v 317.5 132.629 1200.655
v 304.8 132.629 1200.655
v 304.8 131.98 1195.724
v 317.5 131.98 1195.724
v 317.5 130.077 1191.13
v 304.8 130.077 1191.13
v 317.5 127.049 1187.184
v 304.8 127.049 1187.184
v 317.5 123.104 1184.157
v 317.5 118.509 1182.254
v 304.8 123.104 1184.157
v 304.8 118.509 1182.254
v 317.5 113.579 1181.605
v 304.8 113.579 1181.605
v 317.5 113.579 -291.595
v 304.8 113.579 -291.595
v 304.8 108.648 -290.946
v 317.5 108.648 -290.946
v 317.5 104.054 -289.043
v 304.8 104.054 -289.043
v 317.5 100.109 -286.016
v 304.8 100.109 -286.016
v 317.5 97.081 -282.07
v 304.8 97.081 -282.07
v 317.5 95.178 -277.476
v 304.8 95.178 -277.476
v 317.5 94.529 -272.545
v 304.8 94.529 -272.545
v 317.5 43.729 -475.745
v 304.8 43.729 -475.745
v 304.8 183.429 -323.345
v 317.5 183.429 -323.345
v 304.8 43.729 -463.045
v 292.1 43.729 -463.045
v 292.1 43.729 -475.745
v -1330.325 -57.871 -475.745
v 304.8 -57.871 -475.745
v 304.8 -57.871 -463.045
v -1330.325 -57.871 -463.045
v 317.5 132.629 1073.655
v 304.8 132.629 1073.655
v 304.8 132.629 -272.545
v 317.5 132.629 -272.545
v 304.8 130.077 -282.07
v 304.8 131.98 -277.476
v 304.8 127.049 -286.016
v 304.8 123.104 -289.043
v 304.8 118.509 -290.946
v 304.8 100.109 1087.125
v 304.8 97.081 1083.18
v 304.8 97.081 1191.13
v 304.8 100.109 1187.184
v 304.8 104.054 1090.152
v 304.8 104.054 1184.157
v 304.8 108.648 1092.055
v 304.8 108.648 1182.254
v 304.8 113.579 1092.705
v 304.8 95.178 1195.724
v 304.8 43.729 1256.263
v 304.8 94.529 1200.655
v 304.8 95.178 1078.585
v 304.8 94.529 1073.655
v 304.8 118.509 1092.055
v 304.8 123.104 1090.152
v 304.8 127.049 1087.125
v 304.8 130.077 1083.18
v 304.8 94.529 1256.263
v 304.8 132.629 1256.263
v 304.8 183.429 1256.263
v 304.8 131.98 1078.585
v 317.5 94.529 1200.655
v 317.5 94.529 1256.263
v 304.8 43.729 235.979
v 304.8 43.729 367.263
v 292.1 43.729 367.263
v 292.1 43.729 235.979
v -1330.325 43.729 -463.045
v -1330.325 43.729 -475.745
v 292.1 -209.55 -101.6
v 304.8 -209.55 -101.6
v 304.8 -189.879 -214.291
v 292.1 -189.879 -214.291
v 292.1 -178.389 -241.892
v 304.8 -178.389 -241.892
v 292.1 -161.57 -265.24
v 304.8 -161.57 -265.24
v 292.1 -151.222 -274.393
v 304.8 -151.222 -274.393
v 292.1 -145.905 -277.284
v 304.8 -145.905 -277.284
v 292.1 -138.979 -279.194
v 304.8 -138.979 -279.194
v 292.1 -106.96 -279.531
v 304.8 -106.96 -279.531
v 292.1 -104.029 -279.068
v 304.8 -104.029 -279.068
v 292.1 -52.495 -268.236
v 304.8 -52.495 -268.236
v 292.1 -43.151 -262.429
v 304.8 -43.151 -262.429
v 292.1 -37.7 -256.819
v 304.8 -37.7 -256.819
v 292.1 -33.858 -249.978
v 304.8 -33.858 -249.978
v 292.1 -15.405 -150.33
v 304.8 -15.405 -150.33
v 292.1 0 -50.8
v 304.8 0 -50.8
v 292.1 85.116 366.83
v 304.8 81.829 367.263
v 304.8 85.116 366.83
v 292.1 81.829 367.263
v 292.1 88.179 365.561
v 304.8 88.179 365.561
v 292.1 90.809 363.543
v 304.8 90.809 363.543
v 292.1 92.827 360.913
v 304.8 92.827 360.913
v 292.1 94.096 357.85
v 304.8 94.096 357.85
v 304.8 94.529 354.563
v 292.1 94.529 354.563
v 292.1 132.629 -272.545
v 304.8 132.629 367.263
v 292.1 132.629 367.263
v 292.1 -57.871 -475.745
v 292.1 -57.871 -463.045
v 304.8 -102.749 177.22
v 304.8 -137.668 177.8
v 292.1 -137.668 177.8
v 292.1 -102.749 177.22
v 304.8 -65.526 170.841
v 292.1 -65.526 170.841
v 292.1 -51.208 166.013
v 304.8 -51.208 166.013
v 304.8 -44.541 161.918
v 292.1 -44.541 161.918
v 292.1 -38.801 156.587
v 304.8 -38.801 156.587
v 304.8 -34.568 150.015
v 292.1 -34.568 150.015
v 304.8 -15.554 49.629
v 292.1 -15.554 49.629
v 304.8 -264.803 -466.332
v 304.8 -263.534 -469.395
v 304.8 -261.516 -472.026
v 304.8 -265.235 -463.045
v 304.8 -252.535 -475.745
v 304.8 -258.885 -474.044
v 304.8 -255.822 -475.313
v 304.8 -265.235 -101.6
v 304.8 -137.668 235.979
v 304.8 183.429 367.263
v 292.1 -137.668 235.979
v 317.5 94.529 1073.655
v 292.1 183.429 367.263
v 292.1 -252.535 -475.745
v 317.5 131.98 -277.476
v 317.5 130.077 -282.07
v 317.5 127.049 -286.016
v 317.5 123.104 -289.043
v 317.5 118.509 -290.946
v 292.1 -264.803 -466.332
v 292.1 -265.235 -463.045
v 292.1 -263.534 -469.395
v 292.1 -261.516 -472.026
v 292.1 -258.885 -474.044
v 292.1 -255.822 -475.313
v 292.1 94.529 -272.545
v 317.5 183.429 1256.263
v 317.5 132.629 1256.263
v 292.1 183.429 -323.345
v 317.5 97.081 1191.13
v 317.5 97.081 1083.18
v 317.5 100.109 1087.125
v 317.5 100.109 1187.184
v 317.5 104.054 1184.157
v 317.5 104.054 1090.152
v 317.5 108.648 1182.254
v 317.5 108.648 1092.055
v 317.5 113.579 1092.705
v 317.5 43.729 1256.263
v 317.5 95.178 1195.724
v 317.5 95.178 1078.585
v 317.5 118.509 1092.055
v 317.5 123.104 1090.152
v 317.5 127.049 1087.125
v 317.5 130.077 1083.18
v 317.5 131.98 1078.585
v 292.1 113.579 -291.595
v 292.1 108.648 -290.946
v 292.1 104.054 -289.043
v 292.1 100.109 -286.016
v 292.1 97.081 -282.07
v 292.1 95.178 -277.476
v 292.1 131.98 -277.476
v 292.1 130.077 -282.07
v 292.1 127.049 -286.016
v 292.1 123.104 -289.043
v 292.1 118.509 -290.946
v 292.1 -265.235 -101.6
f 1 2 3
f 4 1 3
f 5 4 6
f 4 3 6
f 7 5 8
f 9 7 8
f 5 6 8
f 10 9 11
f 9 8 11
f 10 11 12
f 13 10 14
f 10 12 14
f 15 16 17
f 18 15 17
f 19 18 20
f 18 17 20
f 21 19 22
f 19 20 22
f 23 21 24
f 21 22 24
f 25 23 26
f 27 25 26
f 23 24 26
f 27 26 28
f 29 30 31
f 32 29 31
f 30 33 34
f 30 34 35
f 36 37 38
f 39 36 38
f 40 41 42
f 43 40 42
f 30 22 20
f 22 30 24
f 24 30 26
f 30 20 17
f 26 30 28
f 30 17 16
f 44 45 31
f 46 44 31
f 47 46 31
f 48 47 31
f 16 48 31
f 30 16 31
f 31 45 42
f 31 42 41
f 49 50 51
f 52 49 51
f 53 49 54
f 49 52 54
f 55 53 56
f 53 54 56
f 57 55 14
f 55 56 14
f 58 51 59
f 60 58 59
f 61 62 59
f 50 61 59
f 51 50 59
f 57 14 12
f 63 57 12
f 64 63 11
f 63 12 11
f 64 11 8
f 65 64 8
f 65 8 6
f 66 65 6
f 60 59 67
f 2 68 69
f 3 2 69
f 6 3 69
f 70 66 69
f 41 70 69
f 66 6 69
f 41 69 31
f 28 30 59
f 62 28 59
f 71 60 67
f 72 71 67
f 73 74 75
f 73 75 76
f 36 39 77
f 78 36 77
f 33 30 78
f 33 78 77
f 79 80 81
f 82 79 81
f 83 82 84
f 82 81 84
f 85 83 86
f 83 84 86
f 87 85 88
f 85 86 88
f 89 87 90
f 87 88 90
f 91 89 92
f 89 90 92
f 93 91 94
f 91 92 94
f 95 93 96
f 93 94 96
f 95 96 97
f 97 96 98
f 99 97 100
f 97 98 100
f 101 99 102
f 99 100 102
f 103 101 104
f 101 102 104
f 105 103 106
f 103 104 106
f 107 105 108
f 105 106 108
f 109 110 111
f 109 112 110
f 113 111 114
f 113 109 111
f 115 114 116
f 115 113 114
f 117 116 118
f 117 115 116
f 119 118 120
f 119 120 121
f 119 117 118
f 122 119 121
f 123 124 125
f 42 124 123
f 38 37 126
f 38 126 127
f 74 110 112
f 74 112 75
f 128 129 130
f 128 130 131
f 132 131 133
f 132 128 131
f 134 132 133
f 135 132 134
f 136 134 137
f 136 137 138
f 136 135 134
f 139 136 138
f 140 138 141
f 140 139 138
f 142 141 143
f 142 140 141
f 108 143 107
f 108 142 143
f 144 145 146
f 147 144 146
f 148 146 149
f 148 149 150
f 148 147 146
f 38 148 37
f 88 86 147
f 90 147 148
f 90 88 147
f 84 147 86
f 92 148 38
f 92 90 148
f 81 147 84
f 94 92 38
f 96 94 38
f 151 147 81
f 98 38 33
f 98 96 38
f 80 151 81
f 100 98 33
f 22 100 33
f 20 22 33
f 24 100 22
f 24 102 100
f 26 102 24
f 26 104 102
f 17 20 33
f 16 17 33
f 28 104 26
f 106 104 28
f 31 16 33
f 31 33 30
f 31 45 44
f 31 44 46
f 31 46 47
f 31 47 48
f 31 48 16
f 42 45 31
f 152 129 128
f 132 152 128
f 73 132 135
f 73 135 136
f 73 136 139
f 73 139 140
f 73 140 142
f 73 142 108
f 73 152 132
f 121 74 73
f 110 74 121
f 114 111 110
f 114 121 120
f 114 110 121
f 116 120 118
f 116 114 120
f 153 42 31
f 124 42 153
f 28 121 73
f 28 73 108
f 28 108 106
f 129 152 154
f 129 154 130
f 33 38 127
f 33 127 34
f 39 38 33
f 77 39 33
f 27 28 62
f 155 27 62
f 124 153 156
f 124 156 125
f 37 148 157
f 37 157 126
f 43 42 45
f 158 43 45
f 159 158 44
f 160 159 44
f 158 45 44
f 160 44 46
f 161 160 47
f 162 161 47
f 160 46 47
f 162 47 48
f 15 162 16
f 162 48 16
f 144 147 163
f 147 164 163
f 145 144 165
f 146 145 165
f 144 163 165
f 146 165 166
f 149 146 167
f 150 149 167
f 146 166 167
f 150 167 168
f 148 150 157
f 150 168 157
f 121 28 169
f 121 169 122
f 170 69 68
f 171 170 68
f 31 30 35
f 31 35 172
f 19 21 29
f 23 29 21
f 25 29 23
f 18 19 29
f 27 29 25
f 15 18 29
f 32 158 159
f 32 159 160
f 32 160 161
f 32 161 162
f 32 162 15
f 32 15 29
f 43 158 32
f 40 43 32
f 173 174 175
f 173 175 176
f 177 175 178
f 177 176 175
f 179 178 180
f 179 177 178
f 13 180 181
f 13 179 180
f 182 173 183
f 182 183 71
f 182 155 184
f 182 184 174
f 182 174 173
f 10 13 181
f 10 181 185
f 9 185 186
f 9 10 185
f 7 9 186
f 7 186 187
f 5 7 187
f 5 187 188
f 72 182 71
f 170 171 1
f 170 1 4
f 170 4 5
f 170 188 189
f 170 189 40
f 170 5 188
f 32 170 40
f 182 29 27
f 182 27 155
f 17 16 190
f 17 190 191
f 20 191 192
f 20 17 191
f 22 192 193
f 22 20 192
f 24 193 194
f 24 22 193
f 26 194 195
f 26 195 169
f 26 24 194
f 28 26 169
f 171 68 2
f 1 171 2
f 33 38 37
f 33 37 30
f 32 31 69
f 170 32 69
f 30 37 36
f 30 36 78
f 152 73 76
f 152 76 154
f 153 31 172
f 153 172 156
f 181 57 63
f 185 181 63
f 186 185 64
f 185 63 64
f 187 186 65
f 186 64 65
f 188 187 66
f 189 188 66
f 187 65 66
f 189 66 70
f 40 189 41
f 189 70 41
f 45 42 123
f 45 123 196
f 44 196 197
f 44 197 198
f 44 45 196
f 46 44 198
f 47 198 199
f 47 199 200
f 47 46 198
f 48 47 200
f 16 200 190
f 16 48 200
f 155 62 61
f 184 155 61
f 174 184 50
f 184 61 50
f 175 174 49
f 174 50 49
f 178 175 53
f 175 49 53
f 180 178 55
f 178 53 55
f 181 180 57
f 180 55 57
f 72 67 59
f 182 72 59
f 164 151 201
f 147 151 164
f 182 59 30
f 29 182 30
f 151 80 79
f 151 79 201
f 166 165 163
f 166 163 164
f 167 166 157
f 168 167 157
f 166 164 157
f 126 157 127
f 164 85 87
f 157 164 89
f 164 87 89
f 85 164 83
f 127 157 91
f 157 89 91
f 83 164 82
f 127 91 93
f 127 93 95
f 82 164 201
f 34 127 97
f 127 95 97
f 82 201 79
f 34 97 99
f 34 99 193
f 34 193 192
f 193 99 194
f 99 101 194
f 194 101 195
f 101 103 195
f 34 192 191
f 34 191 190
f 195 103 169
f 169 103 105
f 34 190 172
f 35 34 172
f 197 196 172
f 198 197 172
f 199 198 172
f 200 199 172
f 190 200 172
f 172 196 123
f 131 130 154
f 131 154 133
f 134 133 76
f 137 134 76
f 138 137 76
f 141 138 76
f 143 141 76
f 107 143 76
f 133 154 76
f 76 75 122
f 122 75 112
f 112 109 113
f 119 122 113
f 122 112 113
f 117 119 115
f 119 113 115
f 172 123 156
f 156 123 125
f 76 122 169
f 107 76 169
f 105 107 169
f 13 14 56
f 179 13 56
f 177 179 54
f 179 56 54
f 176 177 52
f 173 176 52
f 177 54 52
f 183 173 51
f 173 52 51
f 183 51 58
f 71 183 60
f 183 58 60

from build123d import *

# Parameters (mm, degrees)
F2_DEPTH = 12.7
F3_DEPTH = 12.7
F4_R     = 12.7
F1_W     = 101.6
F1_H     = 12.7
F5_DEPTH = 1635.125


# Not quite as in the source:
# - a feature names something its author has since deleted; it is built from what else it names


with BuildPart() as f2:
    # F1 (on offset) → F2 (new body)
    with BuildSketch(Plane.YZ.offset(304.8)):
        with BuildLine():
            Line((94.5288948266, 367.2625439401), (43.7288948266, 367.2625439401))
            Line((43.7288948266, 367.2625439401), (43.7288948266, 235.9791994095))
            Line((43.7288948266, 235.9791994095), (43.7288948266, -323.3454918831))
            Line((43.7288948266, -323.3454918831), (113.5788948266, -323.3454918831))
            Line((113.5788948266, -323.3454918831), (113.5788948266, -291.5954918831))
            ThreePointArc((113.5788948266, -291.5954918831), (100.108510645, -286.0158760647), (94.5288948266, -272.5454918831))
            Line((94.5288948266, -272.5454918831), (94.5288948266, 367.2625439401))
        make_face()
        with BuildLine():
            Line((113.5788948266, -291.5954918831), (113.5788948266, -323.3454918831))
            Line((113.5788948266, -323.3454918831), (183.4288948266, -323.3454918831))
            Line((183.4288948266, -323.3454918831), (183.4288948266, 367.2625439401))
            Line((183.4288948266, 367.2625439401), (132.6288948266, 367.2625439401))
            Line((132.6288948266, 367.2625439401), (132.6288948266, -272.5454918831))
            ThreePointArc((132.6288948266, -272.5454918831), (127.0492790082, -286.0158760647), (113.5788948266, -291.5954918831))
        make_face()
        Polygon((113.5788948266, -323.3454918831), (43.7288948266, -323.3454918831), (43.7288948266, -463.0454918831), (43.7288948266, -475.7454918831), (183.4288948266, -323.3454918831), align=None)
        with BuildLine():
            Line((43.7288948266, 1256.2625439401), (43.7288948266, 367.2625439401))
            Line((43.7288948266, 367.2625439401), (94.5288948266, 367.2625439401))
            Line((94.5288948266, 367.2625439401), (94.5288948266, 1073.6545081169))
            ThreePointArc((94.5288948266, 1073.6545081169), (100.108510645, 1087.1248922985), (113.5788948266, 1092.7045081169))
            Line((113.5788948266, 1092.7045081169), (113.5788948266, 1181.6045081169))
            ThreePointArc((113.5788948266, 1181.6045081169), (100.108510645, 1187.1841239353), (94.5288948266, 1200.6545081169))
            Line((94.5288948266, 1200.6545081169), (94.5288948266, 1256.2625439401))
            Line((94.5288948266, 1256.2625439401), (43.7288948266, 1256.2625439401))
        make_face()
        with BuildLine():
            Line((113.5788948266, 1181.6045081169), (113.5788948266, 1092.7045081169))
            ThreePointArc((113.5788948266, 1092.7045081169), (127.0492790082, 1087.1248922985), (132.6288948266, 1073.6545081169))
            Line((132.6288948266, 1073.6545081169), (132.6288948266, 367.2625439401))
            Line((132.6288948266, 367.2625439401), (183.4288948266, 367.2625439401))
            Line((183.4288948266, 367.2625439401), (183.4288948266, 1256.2625439401))
            Line((183.4288948266, 1256.2625439401), (132.6288948266, 1256.2625439401))
            Line((132.6288948266, 1256.2625439401), (132.6288948266, 1200.6545081169))
            ThreePointArc((132.6288948266, 1200.6545081169), (127.0492790082, 1187.1841239353), (113.5788948266, 1181.6045081169))
        make_face()
    extrude(amount=F2_DEPTH)


with BuildPart() as f3:
    # F1 (on offset) → F3 (new body)
    with BuildSketch(Plane.YZ.offset(304.8)):
        with BuildLine():
            Line((94.5288948266, 367.2625439401), (43.7288948266, 367.2625439401))
            Line((43.7288948266, 367.2625439401), (43.7288948266, 235.9791994095))
            Line((43.7288948266, 235.9791994095), (43.7288948266, -323.3454918831))
            Line((43.7288948266, -323.3454918831), (113.5788948266, -323.3454918831))
            Line((113.5788948266, -323.3454918831), (113.5788948266, -291.5954918831))
            ThreePointArc((113.5788948266, -291.5954918831), (100.108510645, -286.0158760647), (94.5288948266, -272.5454918831))
            Line((94.5288948266, -272.5454918831), (94.5288948266, 367.2625439401))
        make_face()
        with BuildLine():
            Line((113.5788948266, -291.5954918831), (113.5788948266, -323.3454918831))
            Line((113.5788948266, -323.3454918831), (183.4288948266, -323.3454918831))
            Line((183.4288948266, -323.3454918831), (183.4288948266, 367.2625439401))
            Line((183.4288948266, 367.2625439401), (132.6288948266, 367.2625439401))
            Line((132.6288948266, 367.2625439401), (132.6288948266, -272.5454918831))
            ThreePointArc((132.6288948266, -272.5454918831), (127.0492790082, -286.0158760647), (113.5788948266, -291.5954918831))
        make_face()
        Polygon((113.5788948266, -323.3454918831), (43.7288948266, -323.3454918831), (43.7288948266, -463.0454918831), (43.7288948266, -475.7454918831), (183.4288948266, -323.3454918831), align=None)
        with BuildLine():
            Line((43.7288948266, -323.3454918831), (43.7288948266, 235.9791994095))
            Line((43.7288948266, 235.9791994095), (-137.668, 235.9791994095))
            Line((-137.668, 235.9791994095), (-137.668, 177.8))
            add(Edge.make_bspline(
                [(-137.668, 177.8), (-126.7329989699, 179.3615885186), (-105.2927447568, 177.9606906514), (-104.7127420428, 177.4566242644), (-76.3870444308, 172.7468877699), (-53.8224361201, 169.2775097956), (-32.509347536, 153.9521162966), (-29.6589175986, 126.5444267311), (-24.1316654123, 101.7655079647), (-20.1515477066, 76.1578540031), (-15.6616591497, 50.824742265), (-11.697736498, 25.3907441448), (-7.6524561633, 0.0190908821), (-3.4145104905, -25.4546553024), (-1.1633071199, -42.1649645919), (0, -50.8)],
                knots=[0.4455893289, 0.4455893289, 0.4455893289, 0.4455893289, 0.4958311767, 0.5059382093, 0.5510171418, 0.5964071949, 0.6390826252, 0.6845795949, 0.7297371842, 0.7748161167, 0.8198950491, 0.8649377925, 0.9099805359, 0.9550232793, 1, 1, 1, 1], degree=3))
            add(Edge.make_bspline(
                [(-209.55, -101.6), (-208.6251552358, -110.5689174615), (-206.6600994581, -126.7951349357), (-202.7469529896, -152.4849572895), (-198.4813992324, -177.8058366363), (-193.5047411073, -203.4515063023), (-185.4017669459, -228.8366501901), (-172.2926489077, -254.3432279678), (-155.2398352434, -272.1810431706), (-140.6010964135, -281.8677246091), (-105.2927447568, -279.5606906514), (-104.7127420428, -279.0566242644), (-76.3870444308, -274.3468877699), (-53.8224361201, -270.8775097956), (-32.509347536, -255.5521162966), (-29.6589175986, -228.1444267311), (-24.1316654123, -203.3655079647), (-20.1515477066, -177.7578540031), (-15.6616591497, -152.424742265), (-11.697736498, -126.9907441448), (-7.6524561633, -101.6190908821), (-3.4145104905, -76.1453446976), (-1.1633071199, -59.4350354081), (0, -50.8)],
                knots=[0.0897198342, 0.0897198342, 0.0897198342, 0.0897198342, 0.1346390991, 0.1796477671, 0.2247266995, 0.269971206, 0.3159019443, 0.3636177586, 0.4065541502, 0.4455893289, 0.4958311767, 0.5059382093, 0.5510171418, 0.5964071949, 0.6390826252, 0.6845795949, 0.7297371842, 0.7748161167, 0.8198950491, 0.8649377925, 0.9099805359, 0.9550232793, 1, 1, 1, 1], degree=3))
            Line((-209.55, -101.6), (-265.2354836464, -101.6))
            Line((-265.2354836464, -101.6), (-265.2354836464, -475.7454918831))
            Line((-265.2354836464, -475.7454918831), (-57.8711051734, -475.7454918831))
            Line((-57.8711051734, -475.7454918831), (-57.8711051734, -463.0454918831))
            Line((-57.8711051734, -463.0454918831), (43.7288948266, -463.0454918831))
            Line((43.7288948266, -463.0454918831), (43.7288948266, -323.3454918831))
        make_face()
    extrude(amount=-F3_DEPTH)

    # F4
    f4_edges = [f3.edges().sort_by_distance(p)[0] for p in [
        (298.45, -265.235484, -475.745492),
        (298.45, 94.528895, 367.262544),
    ]]
    fillet(f4_edges, radius=F4_R)


with BuildPart() as f5:
    # F1 (on offset) → F5 (new body)
    with BuildSketch(Plane.YZ.offset(304.8)):
        with Locations((-7.0711051734, -469.3954918831)):
            Rectangle(F1_W, F1_H)
    extrude(amount=-F5_DEPTH)


solid = Compound([f2.part, f3.part, f5.part])
